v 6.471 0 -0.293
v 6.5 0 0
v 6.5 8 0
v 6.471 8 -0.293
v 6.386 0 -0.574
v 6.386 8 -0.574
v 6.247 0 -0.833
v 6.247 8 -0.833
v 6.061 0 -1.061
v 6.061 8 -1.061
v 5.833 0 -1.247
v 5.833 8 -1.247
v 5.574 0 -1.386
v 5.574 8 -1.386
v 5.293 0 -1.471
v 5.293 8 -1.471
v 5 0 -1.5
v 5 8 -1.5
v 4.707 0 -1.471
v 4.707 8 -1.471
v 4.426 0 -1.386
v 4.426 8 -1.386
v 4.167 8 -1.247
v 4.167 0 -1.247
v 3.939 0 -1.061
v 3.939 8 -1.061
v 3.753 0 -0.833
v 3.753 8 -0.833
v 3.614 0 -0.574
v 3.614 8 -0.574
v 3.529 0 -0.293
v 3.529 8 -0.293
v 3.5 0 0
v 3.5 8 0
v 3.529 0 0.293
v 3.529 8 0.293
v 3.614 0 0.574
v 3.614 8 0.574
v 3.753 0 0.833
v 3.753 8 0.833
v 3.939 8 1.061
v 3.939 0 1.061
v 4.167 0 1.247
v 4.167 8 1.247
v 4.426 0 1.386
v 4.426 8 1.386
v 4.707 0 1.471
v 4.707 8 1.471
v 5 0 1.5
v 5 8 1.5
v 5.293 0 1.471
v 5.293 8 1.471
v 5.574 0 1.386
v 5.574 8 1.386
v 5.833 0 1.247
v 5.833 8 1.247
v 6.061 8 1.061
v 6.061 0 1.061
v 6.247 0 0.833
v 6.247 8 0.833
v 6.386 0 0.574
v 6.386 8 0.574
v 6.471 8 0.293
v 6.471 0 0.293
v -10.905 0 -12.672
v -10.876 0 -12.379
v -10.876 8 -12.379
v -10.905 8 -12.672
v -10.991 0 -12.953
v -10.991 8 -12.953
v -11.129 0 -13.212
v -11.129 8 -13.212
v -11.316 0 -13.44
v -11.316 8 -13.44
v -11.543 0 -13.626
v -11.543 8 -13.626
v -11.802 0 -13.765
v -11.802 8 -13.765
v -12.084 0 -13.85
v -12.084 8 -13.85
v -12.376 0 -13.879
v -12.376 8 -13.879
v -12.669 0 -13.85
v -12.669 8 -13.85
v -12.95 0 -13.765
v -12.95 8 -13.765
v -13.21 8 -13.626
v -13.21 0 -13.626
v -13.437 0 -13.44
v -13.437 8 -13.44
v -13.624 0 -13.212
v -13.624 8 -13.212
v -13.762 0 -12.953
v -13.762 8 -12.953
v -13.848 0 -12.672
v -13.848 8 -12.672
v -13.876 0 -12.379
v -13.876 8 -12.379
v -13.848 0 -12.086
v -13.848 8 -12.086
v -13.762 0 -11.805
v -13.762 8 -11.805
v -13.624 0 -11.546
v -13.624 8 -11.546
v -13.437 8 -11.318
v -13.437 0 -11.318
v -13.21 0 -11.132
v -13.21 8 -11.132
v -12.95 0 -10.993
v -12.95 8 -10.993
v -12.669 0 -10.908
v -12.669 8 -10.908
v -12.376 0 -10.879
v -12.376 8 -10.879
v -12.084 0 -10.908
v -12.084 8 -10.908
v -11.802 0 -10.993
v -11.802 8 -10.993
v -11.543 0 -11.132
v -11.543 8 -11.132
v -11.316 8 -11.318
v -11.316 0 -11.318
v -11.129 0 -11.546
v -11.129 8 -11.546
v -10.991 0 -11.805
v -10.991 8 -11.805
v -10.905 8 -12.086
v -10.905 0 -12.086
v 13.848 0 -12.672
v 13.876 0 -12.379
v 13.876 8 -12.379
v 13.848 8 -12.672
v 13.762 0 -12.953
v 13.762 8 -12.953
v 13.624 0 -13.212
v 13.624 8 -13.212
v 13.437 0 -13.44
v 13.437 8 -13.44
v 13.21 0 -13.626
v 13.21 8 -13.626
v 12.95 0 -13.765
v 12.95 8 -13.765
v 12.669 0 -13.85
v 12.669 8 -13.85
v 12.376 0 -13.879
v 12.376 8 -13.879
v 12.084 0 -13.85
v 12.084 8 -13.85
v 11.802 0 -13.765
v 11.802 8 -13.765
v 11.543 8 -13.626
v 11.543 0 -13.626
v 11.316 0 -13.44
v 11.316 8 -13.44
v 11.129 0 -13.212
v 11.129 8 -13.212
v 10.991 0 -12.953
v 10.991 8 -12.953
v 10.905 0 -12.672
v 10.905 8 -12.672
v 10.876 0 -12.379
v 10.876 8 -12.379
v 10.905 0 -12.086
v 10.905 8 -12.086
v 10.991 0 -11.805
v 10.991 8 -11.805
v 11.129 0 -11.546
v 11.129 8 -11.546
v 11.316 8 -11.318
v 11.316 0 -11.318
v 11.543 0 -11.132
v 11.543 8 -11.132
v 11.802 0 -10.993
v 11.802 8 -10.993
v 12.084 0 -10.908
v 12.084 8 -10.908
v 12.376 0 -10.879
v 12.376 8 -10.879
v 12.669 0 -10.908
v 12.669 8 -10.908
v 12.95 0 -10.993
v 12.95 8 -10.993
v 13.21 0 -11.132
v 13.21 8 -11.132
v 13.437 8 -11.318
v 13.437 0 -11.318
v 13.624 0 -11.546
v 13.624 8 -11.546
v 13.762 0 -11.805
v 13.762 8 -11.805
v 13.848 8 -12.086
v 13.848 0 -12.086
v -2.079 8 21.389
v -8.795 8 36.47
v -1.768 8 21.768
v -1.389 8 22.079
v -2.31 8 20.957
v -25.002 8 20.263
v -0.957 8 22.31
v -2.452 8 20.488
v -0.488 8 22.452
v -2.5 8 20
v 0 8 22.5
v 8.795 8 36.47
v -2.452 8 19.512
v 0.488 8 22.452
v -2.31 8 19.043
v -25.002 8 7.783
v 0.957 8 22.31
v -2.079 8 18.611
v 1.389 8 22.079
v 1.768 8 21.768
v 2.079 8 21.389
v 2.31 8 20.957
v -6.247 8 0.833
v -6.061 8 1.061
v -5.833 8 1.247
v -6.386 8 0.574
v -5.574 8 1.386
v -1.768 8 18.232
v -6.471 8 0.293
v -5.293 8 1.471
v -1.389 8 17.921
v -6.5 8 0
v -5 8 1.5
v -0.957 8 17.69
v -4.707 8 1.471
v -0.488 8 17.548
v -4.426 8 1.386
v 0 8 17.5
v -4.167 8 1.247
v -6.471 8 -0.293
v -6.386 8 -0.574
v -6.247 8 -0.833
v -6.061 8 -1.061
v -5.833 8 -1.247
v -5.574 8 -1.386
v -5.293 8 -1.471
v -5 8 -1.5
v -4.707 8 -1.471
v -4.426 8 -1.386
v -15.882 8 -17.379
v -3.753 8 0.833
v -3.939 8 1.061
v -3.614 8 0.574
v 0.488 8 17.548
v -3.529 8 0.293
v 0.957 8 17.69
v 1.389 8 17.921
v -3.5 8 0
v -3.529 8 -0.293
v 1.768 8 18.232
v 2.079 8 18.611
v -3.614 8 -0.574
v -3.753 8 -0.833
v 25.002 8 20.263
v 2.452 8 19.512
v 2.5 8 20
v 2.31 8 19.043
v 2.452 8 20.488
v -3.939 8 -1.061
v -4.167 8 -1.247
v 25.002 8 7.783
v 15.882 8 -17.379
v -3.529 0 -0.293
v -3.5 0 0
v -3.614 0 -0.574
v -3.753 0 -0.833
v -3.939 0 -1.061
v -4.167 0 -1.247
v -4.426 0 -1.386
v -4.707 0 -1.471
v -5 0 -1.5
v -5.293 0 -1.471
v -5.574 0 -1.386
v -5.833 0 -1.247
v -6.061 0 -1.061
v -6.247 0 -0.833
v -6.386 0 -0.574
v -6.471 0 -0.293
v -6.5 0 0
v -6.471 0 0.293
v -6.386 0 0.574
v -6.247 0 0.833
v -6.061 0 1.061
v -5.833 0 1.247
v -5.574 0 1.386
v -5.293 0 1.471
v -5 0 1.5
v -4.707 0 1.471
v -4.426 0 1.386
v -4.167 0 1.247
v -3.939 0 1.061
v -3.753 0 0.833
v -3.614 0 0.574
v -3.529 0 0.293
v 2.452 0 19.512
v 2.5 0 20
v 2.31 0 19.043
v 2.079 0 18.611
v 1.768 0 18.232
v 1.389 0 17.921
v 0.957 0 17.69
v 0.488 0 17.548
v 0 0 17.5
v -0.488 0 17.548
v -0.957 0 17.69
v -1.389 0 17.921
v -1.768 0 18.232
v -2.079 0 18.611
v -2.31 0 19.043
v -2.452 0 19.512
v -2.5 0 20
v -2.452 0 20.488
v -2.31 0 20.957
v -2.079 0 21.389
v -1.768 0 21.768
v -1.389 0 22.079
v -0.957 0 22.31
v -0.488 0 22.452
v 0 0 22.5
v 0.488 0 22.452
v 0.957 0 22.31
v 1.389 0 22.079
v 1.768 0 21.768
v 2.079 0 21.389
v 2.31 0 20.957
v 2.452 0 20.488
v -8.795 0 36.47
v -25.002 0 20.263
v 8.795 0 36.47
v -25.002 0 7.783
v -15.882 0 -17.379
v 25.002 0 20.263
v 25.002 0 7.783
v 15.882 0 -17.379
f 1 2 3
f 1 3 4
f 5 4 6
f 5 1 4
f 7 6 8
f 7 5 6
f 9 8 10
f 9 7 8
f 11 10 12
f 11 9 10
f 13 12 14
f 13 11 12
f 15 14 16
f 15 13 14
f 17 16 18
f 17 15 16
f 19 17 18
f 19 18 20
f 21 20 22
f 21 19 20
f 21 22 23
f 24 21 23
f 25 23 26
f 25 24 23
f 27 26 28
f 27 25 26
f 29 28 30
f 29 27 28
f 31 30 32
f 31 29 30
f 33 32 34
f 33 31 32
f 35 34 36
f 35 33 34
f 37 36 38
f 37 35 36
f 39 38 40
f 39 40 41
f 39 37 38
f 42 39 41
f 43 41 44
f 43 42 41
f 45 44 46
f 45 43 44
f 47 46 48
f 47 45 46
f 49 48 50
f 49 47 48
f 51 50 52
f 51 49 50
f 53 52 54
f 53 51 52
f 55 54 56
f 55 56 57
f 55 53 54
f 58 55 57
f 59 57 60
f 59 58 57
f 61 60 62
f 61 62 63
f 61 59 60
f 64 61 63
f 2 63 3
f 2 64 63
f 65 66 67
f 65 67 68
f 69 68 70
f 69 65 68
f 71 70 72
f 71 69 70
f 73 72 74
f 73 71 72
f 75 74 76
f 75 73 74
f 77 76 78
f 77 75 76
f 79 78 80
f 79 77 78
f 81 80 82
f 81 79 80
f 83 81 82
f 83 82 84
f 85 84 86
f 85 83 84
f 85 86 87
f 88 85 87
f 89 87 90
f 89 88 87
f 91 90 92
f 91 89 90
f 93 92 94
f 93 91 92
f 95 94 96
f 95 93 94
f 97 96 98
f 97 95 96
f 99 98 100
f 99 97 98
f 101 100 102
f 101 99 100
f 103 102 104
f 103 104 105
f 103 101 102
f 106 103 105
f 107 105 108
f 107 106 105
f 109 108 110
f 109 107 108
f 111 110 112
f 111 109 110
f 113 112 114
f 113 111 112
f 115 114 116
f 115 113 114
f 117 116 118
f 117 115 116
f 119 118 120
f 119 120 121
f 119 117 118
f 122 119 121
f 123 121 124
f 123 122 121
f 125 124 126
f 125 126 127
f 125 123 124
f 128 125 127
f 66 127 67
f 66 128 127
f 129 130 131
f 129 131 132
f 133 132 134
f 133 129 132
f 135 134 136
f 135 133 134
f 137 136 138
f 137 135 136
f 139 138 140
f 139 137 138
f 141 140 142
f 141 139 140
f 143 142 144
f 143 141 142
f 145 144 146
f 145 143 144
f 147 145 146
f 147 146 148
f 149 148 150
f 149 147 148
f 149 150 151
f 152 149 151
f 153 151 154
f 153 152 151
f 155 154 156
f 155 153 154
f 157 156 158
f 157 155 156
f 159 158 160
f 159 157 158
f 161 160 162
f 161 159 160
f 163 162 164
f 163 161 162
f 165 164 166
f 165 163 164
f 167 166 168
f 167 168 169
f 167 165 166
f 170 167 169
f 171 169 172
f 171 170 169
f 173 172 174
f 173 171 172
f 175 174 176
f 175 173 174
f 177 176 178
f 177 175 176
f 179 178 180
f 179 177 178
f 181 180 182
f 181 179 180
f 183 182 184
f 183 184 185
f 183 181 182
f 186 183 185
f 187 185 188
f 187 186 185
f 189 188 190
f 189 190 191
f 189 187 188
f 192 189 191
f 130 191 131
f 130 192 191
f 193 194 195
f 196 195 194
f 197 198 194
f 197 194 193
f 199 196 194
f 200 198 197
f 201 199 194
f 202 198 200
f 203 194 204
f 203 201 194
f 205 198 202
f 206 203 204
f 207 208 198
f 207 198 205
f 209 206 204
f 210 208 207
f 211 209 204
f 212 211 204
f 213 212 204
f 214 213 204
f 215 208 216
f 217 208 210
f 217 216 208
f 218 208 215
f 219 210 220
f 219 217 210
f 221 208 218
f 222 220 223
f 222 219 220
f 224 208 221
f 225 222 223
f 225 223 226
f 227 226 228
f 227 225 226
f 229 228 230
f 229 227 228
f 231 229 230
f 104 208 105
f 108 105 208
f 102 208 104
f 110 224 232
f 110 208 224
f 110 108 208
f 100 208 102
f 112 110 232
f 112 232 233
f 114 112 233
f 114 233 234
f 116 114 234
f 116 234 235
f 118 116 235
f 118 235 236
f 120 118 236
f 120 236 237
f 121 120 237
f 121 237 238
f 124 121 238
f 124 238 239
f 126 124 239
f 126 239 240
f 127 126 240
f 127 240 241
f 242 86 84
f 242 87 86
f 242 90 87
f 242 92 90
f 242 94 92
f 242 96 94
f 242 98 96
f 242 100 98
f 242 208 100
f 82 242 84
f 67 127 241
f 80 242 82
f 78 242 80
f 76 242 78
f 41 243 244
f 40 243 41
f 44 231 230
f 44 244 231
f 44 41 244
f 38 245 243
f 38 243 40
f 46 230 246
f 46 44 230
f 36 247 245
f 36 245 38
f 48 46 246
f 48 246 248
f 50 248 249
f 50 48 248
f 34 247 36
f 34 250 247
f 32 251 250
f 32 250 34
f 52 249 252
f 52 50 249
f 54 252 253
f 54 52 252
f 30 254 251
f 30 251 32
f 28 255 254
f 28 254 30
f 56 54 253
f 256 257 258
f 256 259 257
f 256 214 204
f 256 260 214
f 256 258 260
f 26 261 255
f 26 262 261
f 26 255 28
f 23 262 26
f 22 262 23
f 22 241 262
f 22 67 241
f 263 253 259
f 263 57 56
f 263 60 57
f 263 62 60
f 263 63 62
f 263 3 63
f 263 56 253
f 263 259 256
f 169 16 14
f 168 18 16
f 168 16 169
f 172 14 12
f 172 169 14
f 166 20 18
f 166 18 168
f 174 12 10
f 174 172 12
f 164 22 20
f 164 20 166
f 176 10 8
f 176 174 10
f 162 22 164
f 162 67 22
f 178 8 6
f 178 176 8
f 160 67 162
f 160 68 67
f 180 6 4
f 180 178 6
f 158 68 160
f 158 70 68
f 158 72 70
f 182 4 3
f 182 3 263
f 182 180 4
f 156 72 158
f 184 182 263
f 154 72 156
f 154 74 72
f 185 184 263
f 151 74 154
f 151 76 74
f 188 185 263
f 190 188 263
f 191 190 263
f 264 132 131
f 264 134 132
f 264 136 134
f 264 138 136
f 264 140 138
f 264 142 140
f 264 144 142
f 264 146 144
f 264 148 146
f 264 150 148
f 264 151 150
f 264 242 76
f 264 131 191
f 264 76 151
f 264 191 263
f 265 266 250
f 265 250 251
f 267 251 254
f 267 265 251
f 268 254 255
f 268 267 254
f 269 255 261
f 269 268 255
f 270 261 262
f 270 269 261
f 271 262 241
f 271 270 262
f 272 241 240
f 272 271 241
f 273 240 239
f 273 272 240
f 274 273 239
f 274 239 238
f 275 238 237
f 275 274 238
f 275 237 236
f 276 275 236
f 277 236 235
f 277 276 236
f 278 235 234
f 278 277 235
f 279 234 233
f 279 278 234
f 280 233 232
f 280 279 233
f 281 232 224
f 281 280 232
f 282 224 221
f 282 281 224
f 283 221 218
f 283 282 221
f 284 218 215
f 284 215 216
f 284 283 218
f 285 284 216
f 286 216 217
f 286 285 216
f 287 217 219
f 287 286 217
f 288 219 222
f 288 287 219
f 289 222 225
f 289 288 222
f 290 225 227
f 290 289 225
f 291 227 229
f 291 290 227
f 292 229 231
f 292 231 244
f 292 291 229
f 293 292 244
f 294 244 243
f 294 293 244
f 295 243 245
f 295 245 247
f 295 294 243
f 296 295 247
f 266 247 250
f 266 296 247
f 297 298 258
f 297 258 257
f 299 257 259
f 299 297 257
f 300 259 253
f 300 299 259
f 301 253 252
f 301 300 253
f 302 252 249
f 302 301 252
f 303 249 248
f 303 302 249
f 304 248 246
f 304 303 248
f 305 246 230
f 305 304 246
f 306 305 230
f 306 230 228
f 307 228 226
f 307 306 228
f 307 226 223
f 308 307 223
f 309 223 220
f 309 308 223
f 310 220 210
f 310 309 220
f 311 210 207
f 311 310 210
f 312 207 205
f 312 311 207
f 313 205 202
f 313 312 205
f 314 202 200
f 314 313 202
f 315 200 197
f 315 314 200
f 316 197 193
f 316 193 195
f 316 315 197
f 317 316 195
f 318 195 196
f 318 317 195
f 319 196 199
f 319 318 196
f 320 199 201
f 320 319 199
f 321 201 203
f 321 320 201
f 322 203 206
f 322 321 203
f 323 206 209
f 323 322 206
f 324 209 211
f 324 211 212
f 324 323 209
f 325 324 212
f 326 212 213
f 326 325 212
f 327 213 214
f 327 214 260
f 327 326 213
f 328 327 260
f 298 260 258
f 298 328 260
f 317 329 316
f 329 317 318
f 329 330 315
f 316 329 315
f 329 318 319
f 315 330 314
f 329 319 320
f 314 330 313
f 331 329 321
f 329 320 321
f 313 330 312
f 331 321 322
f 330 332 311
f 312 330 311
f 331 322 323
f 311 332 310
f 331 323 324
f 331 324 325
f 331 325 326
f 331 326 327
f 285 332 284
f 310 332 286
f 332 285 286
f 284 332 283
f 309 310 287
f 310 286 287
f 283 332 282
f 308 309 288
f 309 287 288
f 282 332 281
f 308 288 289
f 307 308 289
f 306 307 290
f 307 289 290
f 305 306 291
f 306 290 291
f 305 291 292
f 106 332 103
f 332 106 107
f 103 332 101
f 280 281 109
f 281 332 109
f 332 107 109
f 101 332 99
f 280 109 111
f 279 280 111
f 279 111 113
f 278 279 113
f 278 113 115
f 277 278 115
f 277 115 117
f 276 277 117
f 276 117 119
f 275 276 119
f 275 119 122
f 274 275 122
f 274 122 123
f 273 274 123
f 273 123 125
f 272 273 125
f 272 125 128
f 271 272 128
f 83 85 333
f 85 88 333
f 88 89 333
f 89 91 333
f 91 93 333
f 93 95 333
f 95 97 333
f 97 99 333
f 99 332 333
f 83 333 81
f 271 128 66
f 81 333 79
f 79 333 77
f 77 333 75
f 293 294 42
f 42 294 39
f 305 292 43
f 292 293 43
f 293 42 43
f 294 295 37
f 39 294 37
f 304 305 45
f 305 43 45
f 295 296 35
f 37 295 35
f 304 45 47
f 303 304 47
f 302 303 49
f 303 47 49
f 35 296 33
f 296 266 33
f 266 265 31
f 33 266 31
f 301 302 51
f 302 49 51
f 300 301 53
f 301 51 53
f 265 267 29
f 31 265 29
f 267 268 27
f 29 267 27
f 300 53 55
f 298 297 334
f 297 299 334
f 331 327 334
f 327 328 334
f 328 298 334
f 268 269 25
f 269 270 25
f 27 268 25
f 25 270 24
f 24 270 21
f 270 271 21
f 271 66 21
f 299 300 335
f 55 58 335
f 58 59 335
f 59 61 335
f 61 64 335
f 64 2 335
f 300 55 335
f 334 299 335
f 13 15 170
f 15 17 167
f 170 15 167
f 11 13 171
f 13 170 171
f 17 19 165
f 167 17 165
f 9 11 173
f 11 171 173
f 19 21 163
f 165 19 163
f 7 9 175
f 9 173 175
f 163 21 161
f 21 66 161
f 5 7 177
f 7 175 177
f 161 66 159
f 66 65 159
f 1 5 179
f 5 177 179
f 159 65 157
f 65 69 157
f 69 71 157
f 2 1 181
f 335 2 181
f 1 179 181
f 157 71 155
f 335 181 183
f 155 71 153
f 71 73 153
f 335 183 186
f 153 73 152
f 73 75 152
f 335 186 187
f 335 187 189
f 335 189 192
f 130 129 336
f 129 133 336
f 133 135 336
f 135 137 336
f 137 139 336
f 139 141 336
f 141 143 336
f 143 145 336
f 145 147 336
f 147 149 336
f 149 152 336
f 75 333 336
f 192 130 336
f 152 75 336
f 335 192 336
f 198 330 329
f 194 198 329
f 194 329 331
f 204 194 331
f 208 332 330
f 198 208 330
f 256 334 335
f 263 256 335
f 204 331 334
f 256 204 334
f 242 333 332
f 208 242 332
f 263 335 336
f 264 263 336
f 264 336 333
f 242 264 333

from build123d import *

# Parameters (mm, degrees)
SKETCH1_R           = 1.5
SKETCH1_R_2         = 2.5
BOSS_EXTRUDE1_DEPTH = 8


with BuildPart() as part:
    # Sketch1 → Boss-Extrude1 (new body)
    with BuildSketch(Plane(origin=(0, 0, 0), x_dir=(1, 0, 0), z_dir=(0, 1, 0))):
        Polygon((-8.795, -36.47), (8.795, -36.47), (25.001887425, -20.263112575), (25.001887425, -7.783112575), (15.88249732, 17.378899724), (-15.88249732, 17.378899724), (-25.001887425, -7.783112575), (-25.001887425, -20.263112575), align=None)
        with Locations((-5, 0)):
            Circle(SKETCH1_R, mode=Mode.SUBTRACT)
        with Locations((5, 0)):
            Circle(SKETCH1_R, mode=Mode.SUBTRACT)
        with Locations((0, -20)):
            Circle(SKETCH1_R_2, mode=Mode.SUBTRACT)
        with Locations((12.37637727, 12.378899724)):
            Circle(SKETCH1_R, mode=Mode.SUBTRACT)
        with Locations((-12.37637727, 12.378899724)):
            Circle(SKETCH1_R, mode=Mode.SUBTRACT)
    extrude(amount=BOSS_EXTRUDE1_DEPTH)


solid = part.part
